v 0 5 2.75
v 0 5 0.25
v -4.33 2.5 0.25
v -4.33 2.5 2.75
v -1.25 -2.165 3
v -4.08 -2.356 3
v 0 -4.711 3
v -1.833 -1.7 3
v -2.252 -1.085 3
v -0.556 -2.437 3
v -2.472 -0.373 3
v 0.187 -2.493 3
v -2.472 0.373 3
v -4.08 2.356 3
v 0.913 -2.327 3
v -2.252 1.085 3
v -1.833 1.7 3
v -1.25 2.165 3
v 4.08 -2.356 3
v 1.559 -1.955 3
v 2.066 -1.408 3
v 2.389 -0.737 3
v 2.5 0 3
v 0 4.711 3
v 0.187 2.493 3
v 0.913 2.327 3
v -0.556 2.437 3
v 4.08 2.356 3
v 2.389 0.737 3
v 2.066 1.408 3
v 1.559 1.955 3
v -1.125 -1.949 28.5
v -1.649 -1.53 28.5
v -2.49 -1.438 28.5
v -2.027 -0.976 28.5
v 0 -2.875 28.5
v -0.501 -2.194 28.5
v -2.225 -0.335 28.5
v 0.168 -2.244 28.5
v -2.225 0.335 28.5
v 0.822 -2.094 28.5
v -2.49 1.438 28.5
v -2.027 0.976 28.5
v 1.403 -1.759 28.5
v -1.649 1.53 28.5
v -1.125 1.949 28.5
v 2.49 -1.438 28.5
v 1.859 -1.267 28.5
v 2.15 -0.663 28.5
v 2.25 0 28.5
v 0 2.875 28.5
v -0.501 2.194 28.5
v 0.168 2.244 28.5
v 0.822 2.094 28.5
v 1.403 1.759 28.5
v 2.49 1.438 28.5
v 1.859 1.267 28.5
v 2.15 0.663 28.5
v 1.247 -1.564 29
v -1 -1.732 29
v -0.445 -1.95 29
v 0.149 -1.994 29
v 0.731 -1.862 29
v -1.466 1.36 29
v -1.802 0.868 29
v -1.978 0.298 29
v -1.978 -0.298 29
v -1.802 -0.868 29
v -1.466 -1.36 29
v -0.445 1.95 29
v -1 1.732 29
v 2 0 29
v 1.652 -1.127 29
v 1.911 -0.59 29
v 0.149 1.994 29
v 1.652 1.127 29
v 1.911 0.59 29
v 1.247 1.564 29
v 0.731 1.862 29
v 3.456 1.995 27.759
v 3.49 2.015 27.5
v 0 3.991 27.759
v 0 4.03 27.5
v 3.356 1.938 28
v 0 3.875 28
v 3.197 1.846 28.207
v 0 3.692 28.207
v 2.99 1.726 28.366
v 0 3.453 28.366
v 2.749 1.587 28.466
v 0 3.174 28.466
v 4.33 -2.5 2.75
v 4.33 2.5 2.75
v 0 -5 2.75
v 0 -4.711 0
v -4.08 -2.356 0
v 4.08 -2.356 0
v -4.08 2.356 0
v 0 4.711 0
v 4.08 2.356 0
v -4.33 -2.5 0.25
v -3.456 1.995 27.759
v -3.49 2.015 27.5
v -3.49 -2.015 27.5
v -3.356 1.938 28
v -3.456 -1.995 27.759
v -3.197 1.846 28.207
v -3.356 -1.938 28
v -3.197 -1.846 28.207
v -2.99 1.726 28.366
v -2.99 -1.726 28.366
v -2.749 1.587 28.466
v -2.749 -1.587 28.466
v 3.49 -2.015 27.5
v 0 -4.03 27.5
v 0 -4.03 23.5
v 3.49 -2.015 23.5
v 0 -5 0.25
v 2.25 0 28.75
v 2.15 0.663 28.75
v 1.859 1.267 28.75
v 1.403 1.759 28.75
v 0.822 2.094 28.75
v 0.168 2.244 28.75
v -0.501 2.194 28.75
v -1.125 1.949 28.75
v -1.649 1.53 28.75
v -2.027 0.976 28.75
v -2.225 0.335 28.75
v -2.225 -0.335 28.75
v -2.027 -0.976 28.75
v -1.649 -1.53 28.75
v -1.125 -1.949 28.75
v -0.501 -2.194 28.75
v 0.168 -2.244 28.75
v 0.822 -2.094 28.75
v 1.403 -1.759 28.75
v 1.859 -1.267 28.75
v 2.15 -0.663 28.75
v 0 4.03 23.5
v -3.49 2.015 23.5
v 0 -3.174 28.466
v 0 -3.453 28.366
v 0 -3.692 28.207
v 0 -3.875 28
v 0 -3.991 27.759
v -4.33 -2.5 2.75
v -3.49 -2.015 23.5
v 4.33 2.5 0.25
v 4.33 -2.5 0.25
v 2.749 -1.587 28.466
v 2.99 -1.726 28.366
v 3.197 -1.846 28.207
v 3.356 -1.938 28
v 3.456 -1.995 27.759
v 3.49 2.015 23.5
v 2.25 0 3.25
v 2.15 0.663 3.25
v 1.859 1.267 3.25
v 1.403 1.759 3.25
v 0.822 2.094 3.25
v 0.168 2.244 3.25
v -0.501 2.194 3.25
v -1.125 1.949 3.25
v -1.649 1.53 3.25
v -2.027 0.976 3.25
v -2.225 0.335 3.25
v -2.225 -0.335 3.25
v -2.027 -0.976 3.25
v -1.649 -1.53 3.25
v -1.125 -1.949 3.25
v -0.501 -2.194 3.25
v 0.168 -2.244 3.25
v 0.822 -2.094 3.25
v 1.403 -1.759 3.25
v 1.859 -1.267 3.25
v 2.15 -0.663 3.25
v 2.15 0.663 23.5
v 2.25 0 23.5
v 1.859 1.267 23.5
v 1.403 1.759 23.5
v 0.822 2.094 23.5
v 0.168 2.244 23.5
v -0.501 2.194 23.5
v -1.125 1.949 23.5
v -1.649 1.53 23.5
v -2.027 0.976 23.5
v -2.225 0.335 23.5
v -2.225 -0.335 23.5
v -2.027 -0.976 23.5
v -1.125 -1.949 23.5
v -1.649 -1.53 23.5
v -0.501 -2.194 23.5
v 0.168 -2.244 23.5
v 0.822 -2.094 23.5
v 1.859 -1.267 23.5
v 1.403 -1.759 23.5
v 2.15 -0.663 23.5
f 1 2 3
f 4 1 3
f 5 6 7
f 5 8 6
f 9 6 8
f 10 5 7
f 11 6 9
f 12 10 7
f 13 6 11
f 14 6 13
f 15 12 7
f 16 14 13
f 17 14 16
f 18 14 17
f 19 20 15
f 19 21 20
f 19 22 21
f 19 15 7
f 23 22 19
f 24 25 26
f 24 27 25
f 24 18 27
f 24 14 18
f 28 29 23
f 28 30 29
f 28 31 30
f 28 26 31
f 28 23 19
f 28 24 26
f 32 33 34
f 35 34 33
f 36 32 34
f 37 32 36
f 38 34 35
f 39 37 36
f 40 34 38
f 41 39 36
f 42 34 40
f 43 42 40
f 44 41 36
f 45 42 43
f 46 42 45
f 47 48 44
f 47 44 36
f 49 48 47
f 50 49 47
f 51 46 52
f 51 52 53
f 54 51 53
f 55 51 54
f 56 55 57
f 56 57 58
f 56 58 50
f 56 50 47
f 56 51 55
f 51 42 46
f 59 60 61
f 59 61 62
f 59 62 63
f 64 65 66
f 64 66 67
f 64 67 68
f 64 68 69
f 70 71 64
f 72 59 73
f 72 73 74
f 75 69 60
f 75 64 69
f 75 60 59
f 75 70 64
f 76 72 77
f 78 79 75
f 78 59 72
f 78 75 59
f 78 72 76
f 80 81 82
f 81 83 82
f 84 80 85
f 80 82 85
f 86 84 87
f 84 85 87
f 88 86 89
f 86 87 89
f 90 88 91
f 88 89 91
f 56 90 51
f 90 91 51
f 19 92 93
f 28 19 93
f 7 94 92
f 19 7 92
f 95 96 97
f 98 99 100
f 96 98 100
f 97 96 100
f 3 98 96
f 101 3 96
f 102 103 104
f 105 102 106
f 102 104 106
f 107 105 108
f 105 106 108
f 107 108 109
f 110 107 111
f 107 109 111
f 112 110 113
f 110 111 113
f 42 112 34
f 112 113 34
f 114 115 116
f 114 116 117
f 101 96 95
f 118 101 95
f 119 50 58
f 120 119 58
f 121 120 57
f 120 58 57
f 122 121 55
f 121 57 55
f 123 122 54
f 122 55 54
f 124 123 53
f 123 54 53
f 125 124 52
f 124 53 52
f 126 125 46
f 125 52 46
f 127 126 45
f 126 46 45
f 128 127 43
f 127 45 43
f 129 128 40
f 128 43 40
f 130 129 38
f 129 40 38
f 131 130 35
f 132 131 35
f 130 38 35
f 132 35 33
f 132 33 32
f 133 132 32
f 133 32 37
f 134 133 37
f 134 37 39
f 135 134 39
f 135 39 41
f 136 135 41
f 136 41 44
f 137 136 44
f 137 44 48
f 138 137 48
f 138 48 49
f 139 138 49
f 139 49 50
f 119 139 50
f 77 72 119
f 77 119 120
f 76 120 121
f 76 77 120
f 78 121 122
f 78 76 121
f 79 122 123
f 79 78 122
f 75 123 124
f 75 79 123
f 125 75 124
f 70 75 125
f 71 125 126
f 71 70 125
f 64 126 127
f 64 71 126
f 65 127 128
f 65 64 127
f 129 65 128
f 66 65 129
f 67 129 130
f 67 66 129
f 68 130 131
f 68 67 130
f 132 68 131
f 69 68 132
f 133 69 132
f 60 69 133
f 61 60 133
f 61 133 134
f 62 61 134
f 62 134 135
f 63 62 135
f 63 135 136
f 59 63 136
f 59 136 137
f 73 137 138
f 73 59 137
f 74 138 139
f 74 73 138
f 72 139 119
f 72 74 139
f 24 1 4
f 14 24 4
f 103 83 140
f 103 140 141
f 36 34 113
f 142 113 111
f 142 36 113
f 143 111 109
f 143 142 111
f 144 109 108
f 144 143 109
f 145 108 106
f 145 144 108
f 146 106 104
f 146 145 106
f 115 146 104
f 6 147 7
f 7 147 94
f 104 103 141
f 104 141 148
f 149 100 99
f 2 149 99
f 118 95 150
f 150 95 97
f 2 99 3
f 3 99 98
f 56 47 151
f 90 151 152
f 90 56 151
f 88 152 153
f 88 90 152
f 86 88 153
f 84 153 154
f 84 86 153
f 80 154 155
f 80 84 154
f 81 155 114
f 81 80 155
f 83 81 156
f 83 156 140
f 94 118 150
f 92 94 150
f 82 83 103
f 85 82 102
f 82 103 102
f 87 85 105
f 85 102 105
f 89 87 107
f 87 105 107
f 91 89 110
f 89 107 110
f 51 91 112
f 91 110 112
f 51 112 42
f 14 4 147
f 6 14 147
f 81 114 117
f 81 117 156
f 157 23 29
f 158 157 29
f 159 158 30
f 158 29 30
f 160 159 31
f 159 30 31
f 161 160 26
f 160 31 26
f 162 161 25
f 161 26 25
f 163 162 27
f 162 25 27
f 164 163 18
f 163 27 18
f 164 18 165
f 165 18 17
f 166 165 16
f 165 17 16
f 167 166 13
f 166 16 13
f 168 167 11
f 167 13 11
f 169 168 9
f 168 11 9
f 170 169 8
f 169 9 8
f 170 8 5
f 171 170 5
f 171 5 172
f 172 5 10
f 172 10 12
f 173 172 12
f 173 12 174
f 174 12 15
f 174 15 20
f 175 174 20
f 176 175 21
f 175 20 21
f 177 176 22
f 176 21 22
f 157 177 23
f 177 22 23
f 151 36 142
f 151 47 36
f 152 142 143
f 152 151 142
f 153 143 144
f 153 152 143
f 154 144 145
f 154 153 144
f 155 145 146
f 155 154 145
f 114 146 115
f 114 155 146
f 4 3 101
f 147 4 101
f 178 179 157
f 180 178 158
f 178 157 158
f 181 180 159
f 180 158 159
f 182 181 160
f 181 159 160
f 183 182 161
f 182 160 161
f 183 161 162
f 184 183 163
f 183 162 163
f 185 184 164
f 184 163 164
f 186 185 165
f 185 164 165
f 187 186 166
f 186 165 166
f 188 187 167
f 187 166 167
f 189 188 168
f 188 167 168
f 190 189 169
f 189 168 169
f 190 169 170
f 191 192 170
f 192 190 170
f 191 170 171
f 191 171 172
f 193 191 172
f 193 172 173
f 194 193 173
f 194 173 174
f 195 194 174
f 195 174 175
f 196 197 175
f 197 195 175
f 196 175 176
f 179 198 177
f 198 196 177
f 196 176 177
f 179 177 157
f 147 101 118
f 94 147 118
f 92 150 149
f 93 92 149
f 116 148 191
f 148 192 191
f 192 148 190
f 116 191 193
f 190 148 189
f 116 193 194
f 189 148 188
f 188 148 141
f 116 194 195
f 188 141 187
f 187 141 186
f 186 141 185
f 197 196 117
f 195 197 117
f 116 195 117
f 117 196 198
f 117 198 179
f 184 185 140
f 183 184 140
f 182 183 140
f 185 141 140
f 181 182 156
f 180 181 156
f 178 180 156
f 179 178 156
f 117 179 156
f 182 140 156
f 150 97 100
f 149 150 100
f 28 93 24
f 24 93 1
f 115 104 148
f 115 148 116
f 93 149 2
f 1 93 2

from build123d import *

# Parameters (mm, degrees)
PAD_DEPTH    = 3
SKETCH001_R  = 2.25
PAD001_DEPTH = 26
PAD002_START = -0.5
PAD002_DEPTH = 5
FILLET_R     = 1
CHAMFER_SIZE = 0.25


with BuildPart() as part:
    # Sketch → Pad (new body)
    with BuildSketch(Plane.XY):
        Polygon((0, 5), (-4.330127, 2.5), (-4.330127, -2.5), (0, -5), (4.330127, -2.5), (4.330127, 2.5), align=None)
    extrude(amount=PAD_DEPTH)

    # Sketch001 (on Face8 of Pad) → Pad001 (join)
    with BuildSketch(Plane.XY.offset(3)):
        Circle(SKETCH001_R)
    extrude(amount=PAD001_DEPTH)

    # Sketch002 (on Face10 of Pad001) → Pad002 (join)
    with BuildSketch(Plane.XY.offset(29).offset(PAD002_START)):
        Polygon((0, 4.03), (-3.490082, 2.015), (-3.490082, -2.015), (0, -4.03), (3.490082, -2.015), (3.490082, 2.015), align=None)
    extrude(amount=-PAD002_DEPTH)

    # Fillet
    fillet_edges = [part.edges().sort_by_distance(p)[0] for p in [
        (1.745041, -3.0225, 28.5),
        (3.490082, 0, 28.5),
        (1.745041, 3.0225, 28.5),
        (-1.745041, 3.0225, 28.5),
        (-3.490082, 0, 28.5),
        (-1.745041, -3.0225, 28.5),
    ]]
    fillet(fillet_edges, radius=FILLET_R)

    # Chamfer
    chamfer_edges = [part.edges().sort_by_distance(p)[0] for p in [
        (-2.165064, 3.75, 0),
        (-4.330127, 0, 0),
        (-2.165064, -3.75, 0),
        (2.165064, -3.75, 0),
        (4.330127, 0, 0),
        (2.165064, 3.75, 0),
        (-2.165064, 3.75, 3),
        (2.165064, 3.75, 3),
        (-4.330127, 0, 3),
        (4.330127, 0, 3),
        (-2.165064, -3.75, 3),
        (2.165064, -3.75, 3),
        (-2.25, 0, 3),
        (-2.25, 0, 29),
    ]]
    chamfer(chamfer_edges, length=CHAMFER_SIZE)


solid = part.part
